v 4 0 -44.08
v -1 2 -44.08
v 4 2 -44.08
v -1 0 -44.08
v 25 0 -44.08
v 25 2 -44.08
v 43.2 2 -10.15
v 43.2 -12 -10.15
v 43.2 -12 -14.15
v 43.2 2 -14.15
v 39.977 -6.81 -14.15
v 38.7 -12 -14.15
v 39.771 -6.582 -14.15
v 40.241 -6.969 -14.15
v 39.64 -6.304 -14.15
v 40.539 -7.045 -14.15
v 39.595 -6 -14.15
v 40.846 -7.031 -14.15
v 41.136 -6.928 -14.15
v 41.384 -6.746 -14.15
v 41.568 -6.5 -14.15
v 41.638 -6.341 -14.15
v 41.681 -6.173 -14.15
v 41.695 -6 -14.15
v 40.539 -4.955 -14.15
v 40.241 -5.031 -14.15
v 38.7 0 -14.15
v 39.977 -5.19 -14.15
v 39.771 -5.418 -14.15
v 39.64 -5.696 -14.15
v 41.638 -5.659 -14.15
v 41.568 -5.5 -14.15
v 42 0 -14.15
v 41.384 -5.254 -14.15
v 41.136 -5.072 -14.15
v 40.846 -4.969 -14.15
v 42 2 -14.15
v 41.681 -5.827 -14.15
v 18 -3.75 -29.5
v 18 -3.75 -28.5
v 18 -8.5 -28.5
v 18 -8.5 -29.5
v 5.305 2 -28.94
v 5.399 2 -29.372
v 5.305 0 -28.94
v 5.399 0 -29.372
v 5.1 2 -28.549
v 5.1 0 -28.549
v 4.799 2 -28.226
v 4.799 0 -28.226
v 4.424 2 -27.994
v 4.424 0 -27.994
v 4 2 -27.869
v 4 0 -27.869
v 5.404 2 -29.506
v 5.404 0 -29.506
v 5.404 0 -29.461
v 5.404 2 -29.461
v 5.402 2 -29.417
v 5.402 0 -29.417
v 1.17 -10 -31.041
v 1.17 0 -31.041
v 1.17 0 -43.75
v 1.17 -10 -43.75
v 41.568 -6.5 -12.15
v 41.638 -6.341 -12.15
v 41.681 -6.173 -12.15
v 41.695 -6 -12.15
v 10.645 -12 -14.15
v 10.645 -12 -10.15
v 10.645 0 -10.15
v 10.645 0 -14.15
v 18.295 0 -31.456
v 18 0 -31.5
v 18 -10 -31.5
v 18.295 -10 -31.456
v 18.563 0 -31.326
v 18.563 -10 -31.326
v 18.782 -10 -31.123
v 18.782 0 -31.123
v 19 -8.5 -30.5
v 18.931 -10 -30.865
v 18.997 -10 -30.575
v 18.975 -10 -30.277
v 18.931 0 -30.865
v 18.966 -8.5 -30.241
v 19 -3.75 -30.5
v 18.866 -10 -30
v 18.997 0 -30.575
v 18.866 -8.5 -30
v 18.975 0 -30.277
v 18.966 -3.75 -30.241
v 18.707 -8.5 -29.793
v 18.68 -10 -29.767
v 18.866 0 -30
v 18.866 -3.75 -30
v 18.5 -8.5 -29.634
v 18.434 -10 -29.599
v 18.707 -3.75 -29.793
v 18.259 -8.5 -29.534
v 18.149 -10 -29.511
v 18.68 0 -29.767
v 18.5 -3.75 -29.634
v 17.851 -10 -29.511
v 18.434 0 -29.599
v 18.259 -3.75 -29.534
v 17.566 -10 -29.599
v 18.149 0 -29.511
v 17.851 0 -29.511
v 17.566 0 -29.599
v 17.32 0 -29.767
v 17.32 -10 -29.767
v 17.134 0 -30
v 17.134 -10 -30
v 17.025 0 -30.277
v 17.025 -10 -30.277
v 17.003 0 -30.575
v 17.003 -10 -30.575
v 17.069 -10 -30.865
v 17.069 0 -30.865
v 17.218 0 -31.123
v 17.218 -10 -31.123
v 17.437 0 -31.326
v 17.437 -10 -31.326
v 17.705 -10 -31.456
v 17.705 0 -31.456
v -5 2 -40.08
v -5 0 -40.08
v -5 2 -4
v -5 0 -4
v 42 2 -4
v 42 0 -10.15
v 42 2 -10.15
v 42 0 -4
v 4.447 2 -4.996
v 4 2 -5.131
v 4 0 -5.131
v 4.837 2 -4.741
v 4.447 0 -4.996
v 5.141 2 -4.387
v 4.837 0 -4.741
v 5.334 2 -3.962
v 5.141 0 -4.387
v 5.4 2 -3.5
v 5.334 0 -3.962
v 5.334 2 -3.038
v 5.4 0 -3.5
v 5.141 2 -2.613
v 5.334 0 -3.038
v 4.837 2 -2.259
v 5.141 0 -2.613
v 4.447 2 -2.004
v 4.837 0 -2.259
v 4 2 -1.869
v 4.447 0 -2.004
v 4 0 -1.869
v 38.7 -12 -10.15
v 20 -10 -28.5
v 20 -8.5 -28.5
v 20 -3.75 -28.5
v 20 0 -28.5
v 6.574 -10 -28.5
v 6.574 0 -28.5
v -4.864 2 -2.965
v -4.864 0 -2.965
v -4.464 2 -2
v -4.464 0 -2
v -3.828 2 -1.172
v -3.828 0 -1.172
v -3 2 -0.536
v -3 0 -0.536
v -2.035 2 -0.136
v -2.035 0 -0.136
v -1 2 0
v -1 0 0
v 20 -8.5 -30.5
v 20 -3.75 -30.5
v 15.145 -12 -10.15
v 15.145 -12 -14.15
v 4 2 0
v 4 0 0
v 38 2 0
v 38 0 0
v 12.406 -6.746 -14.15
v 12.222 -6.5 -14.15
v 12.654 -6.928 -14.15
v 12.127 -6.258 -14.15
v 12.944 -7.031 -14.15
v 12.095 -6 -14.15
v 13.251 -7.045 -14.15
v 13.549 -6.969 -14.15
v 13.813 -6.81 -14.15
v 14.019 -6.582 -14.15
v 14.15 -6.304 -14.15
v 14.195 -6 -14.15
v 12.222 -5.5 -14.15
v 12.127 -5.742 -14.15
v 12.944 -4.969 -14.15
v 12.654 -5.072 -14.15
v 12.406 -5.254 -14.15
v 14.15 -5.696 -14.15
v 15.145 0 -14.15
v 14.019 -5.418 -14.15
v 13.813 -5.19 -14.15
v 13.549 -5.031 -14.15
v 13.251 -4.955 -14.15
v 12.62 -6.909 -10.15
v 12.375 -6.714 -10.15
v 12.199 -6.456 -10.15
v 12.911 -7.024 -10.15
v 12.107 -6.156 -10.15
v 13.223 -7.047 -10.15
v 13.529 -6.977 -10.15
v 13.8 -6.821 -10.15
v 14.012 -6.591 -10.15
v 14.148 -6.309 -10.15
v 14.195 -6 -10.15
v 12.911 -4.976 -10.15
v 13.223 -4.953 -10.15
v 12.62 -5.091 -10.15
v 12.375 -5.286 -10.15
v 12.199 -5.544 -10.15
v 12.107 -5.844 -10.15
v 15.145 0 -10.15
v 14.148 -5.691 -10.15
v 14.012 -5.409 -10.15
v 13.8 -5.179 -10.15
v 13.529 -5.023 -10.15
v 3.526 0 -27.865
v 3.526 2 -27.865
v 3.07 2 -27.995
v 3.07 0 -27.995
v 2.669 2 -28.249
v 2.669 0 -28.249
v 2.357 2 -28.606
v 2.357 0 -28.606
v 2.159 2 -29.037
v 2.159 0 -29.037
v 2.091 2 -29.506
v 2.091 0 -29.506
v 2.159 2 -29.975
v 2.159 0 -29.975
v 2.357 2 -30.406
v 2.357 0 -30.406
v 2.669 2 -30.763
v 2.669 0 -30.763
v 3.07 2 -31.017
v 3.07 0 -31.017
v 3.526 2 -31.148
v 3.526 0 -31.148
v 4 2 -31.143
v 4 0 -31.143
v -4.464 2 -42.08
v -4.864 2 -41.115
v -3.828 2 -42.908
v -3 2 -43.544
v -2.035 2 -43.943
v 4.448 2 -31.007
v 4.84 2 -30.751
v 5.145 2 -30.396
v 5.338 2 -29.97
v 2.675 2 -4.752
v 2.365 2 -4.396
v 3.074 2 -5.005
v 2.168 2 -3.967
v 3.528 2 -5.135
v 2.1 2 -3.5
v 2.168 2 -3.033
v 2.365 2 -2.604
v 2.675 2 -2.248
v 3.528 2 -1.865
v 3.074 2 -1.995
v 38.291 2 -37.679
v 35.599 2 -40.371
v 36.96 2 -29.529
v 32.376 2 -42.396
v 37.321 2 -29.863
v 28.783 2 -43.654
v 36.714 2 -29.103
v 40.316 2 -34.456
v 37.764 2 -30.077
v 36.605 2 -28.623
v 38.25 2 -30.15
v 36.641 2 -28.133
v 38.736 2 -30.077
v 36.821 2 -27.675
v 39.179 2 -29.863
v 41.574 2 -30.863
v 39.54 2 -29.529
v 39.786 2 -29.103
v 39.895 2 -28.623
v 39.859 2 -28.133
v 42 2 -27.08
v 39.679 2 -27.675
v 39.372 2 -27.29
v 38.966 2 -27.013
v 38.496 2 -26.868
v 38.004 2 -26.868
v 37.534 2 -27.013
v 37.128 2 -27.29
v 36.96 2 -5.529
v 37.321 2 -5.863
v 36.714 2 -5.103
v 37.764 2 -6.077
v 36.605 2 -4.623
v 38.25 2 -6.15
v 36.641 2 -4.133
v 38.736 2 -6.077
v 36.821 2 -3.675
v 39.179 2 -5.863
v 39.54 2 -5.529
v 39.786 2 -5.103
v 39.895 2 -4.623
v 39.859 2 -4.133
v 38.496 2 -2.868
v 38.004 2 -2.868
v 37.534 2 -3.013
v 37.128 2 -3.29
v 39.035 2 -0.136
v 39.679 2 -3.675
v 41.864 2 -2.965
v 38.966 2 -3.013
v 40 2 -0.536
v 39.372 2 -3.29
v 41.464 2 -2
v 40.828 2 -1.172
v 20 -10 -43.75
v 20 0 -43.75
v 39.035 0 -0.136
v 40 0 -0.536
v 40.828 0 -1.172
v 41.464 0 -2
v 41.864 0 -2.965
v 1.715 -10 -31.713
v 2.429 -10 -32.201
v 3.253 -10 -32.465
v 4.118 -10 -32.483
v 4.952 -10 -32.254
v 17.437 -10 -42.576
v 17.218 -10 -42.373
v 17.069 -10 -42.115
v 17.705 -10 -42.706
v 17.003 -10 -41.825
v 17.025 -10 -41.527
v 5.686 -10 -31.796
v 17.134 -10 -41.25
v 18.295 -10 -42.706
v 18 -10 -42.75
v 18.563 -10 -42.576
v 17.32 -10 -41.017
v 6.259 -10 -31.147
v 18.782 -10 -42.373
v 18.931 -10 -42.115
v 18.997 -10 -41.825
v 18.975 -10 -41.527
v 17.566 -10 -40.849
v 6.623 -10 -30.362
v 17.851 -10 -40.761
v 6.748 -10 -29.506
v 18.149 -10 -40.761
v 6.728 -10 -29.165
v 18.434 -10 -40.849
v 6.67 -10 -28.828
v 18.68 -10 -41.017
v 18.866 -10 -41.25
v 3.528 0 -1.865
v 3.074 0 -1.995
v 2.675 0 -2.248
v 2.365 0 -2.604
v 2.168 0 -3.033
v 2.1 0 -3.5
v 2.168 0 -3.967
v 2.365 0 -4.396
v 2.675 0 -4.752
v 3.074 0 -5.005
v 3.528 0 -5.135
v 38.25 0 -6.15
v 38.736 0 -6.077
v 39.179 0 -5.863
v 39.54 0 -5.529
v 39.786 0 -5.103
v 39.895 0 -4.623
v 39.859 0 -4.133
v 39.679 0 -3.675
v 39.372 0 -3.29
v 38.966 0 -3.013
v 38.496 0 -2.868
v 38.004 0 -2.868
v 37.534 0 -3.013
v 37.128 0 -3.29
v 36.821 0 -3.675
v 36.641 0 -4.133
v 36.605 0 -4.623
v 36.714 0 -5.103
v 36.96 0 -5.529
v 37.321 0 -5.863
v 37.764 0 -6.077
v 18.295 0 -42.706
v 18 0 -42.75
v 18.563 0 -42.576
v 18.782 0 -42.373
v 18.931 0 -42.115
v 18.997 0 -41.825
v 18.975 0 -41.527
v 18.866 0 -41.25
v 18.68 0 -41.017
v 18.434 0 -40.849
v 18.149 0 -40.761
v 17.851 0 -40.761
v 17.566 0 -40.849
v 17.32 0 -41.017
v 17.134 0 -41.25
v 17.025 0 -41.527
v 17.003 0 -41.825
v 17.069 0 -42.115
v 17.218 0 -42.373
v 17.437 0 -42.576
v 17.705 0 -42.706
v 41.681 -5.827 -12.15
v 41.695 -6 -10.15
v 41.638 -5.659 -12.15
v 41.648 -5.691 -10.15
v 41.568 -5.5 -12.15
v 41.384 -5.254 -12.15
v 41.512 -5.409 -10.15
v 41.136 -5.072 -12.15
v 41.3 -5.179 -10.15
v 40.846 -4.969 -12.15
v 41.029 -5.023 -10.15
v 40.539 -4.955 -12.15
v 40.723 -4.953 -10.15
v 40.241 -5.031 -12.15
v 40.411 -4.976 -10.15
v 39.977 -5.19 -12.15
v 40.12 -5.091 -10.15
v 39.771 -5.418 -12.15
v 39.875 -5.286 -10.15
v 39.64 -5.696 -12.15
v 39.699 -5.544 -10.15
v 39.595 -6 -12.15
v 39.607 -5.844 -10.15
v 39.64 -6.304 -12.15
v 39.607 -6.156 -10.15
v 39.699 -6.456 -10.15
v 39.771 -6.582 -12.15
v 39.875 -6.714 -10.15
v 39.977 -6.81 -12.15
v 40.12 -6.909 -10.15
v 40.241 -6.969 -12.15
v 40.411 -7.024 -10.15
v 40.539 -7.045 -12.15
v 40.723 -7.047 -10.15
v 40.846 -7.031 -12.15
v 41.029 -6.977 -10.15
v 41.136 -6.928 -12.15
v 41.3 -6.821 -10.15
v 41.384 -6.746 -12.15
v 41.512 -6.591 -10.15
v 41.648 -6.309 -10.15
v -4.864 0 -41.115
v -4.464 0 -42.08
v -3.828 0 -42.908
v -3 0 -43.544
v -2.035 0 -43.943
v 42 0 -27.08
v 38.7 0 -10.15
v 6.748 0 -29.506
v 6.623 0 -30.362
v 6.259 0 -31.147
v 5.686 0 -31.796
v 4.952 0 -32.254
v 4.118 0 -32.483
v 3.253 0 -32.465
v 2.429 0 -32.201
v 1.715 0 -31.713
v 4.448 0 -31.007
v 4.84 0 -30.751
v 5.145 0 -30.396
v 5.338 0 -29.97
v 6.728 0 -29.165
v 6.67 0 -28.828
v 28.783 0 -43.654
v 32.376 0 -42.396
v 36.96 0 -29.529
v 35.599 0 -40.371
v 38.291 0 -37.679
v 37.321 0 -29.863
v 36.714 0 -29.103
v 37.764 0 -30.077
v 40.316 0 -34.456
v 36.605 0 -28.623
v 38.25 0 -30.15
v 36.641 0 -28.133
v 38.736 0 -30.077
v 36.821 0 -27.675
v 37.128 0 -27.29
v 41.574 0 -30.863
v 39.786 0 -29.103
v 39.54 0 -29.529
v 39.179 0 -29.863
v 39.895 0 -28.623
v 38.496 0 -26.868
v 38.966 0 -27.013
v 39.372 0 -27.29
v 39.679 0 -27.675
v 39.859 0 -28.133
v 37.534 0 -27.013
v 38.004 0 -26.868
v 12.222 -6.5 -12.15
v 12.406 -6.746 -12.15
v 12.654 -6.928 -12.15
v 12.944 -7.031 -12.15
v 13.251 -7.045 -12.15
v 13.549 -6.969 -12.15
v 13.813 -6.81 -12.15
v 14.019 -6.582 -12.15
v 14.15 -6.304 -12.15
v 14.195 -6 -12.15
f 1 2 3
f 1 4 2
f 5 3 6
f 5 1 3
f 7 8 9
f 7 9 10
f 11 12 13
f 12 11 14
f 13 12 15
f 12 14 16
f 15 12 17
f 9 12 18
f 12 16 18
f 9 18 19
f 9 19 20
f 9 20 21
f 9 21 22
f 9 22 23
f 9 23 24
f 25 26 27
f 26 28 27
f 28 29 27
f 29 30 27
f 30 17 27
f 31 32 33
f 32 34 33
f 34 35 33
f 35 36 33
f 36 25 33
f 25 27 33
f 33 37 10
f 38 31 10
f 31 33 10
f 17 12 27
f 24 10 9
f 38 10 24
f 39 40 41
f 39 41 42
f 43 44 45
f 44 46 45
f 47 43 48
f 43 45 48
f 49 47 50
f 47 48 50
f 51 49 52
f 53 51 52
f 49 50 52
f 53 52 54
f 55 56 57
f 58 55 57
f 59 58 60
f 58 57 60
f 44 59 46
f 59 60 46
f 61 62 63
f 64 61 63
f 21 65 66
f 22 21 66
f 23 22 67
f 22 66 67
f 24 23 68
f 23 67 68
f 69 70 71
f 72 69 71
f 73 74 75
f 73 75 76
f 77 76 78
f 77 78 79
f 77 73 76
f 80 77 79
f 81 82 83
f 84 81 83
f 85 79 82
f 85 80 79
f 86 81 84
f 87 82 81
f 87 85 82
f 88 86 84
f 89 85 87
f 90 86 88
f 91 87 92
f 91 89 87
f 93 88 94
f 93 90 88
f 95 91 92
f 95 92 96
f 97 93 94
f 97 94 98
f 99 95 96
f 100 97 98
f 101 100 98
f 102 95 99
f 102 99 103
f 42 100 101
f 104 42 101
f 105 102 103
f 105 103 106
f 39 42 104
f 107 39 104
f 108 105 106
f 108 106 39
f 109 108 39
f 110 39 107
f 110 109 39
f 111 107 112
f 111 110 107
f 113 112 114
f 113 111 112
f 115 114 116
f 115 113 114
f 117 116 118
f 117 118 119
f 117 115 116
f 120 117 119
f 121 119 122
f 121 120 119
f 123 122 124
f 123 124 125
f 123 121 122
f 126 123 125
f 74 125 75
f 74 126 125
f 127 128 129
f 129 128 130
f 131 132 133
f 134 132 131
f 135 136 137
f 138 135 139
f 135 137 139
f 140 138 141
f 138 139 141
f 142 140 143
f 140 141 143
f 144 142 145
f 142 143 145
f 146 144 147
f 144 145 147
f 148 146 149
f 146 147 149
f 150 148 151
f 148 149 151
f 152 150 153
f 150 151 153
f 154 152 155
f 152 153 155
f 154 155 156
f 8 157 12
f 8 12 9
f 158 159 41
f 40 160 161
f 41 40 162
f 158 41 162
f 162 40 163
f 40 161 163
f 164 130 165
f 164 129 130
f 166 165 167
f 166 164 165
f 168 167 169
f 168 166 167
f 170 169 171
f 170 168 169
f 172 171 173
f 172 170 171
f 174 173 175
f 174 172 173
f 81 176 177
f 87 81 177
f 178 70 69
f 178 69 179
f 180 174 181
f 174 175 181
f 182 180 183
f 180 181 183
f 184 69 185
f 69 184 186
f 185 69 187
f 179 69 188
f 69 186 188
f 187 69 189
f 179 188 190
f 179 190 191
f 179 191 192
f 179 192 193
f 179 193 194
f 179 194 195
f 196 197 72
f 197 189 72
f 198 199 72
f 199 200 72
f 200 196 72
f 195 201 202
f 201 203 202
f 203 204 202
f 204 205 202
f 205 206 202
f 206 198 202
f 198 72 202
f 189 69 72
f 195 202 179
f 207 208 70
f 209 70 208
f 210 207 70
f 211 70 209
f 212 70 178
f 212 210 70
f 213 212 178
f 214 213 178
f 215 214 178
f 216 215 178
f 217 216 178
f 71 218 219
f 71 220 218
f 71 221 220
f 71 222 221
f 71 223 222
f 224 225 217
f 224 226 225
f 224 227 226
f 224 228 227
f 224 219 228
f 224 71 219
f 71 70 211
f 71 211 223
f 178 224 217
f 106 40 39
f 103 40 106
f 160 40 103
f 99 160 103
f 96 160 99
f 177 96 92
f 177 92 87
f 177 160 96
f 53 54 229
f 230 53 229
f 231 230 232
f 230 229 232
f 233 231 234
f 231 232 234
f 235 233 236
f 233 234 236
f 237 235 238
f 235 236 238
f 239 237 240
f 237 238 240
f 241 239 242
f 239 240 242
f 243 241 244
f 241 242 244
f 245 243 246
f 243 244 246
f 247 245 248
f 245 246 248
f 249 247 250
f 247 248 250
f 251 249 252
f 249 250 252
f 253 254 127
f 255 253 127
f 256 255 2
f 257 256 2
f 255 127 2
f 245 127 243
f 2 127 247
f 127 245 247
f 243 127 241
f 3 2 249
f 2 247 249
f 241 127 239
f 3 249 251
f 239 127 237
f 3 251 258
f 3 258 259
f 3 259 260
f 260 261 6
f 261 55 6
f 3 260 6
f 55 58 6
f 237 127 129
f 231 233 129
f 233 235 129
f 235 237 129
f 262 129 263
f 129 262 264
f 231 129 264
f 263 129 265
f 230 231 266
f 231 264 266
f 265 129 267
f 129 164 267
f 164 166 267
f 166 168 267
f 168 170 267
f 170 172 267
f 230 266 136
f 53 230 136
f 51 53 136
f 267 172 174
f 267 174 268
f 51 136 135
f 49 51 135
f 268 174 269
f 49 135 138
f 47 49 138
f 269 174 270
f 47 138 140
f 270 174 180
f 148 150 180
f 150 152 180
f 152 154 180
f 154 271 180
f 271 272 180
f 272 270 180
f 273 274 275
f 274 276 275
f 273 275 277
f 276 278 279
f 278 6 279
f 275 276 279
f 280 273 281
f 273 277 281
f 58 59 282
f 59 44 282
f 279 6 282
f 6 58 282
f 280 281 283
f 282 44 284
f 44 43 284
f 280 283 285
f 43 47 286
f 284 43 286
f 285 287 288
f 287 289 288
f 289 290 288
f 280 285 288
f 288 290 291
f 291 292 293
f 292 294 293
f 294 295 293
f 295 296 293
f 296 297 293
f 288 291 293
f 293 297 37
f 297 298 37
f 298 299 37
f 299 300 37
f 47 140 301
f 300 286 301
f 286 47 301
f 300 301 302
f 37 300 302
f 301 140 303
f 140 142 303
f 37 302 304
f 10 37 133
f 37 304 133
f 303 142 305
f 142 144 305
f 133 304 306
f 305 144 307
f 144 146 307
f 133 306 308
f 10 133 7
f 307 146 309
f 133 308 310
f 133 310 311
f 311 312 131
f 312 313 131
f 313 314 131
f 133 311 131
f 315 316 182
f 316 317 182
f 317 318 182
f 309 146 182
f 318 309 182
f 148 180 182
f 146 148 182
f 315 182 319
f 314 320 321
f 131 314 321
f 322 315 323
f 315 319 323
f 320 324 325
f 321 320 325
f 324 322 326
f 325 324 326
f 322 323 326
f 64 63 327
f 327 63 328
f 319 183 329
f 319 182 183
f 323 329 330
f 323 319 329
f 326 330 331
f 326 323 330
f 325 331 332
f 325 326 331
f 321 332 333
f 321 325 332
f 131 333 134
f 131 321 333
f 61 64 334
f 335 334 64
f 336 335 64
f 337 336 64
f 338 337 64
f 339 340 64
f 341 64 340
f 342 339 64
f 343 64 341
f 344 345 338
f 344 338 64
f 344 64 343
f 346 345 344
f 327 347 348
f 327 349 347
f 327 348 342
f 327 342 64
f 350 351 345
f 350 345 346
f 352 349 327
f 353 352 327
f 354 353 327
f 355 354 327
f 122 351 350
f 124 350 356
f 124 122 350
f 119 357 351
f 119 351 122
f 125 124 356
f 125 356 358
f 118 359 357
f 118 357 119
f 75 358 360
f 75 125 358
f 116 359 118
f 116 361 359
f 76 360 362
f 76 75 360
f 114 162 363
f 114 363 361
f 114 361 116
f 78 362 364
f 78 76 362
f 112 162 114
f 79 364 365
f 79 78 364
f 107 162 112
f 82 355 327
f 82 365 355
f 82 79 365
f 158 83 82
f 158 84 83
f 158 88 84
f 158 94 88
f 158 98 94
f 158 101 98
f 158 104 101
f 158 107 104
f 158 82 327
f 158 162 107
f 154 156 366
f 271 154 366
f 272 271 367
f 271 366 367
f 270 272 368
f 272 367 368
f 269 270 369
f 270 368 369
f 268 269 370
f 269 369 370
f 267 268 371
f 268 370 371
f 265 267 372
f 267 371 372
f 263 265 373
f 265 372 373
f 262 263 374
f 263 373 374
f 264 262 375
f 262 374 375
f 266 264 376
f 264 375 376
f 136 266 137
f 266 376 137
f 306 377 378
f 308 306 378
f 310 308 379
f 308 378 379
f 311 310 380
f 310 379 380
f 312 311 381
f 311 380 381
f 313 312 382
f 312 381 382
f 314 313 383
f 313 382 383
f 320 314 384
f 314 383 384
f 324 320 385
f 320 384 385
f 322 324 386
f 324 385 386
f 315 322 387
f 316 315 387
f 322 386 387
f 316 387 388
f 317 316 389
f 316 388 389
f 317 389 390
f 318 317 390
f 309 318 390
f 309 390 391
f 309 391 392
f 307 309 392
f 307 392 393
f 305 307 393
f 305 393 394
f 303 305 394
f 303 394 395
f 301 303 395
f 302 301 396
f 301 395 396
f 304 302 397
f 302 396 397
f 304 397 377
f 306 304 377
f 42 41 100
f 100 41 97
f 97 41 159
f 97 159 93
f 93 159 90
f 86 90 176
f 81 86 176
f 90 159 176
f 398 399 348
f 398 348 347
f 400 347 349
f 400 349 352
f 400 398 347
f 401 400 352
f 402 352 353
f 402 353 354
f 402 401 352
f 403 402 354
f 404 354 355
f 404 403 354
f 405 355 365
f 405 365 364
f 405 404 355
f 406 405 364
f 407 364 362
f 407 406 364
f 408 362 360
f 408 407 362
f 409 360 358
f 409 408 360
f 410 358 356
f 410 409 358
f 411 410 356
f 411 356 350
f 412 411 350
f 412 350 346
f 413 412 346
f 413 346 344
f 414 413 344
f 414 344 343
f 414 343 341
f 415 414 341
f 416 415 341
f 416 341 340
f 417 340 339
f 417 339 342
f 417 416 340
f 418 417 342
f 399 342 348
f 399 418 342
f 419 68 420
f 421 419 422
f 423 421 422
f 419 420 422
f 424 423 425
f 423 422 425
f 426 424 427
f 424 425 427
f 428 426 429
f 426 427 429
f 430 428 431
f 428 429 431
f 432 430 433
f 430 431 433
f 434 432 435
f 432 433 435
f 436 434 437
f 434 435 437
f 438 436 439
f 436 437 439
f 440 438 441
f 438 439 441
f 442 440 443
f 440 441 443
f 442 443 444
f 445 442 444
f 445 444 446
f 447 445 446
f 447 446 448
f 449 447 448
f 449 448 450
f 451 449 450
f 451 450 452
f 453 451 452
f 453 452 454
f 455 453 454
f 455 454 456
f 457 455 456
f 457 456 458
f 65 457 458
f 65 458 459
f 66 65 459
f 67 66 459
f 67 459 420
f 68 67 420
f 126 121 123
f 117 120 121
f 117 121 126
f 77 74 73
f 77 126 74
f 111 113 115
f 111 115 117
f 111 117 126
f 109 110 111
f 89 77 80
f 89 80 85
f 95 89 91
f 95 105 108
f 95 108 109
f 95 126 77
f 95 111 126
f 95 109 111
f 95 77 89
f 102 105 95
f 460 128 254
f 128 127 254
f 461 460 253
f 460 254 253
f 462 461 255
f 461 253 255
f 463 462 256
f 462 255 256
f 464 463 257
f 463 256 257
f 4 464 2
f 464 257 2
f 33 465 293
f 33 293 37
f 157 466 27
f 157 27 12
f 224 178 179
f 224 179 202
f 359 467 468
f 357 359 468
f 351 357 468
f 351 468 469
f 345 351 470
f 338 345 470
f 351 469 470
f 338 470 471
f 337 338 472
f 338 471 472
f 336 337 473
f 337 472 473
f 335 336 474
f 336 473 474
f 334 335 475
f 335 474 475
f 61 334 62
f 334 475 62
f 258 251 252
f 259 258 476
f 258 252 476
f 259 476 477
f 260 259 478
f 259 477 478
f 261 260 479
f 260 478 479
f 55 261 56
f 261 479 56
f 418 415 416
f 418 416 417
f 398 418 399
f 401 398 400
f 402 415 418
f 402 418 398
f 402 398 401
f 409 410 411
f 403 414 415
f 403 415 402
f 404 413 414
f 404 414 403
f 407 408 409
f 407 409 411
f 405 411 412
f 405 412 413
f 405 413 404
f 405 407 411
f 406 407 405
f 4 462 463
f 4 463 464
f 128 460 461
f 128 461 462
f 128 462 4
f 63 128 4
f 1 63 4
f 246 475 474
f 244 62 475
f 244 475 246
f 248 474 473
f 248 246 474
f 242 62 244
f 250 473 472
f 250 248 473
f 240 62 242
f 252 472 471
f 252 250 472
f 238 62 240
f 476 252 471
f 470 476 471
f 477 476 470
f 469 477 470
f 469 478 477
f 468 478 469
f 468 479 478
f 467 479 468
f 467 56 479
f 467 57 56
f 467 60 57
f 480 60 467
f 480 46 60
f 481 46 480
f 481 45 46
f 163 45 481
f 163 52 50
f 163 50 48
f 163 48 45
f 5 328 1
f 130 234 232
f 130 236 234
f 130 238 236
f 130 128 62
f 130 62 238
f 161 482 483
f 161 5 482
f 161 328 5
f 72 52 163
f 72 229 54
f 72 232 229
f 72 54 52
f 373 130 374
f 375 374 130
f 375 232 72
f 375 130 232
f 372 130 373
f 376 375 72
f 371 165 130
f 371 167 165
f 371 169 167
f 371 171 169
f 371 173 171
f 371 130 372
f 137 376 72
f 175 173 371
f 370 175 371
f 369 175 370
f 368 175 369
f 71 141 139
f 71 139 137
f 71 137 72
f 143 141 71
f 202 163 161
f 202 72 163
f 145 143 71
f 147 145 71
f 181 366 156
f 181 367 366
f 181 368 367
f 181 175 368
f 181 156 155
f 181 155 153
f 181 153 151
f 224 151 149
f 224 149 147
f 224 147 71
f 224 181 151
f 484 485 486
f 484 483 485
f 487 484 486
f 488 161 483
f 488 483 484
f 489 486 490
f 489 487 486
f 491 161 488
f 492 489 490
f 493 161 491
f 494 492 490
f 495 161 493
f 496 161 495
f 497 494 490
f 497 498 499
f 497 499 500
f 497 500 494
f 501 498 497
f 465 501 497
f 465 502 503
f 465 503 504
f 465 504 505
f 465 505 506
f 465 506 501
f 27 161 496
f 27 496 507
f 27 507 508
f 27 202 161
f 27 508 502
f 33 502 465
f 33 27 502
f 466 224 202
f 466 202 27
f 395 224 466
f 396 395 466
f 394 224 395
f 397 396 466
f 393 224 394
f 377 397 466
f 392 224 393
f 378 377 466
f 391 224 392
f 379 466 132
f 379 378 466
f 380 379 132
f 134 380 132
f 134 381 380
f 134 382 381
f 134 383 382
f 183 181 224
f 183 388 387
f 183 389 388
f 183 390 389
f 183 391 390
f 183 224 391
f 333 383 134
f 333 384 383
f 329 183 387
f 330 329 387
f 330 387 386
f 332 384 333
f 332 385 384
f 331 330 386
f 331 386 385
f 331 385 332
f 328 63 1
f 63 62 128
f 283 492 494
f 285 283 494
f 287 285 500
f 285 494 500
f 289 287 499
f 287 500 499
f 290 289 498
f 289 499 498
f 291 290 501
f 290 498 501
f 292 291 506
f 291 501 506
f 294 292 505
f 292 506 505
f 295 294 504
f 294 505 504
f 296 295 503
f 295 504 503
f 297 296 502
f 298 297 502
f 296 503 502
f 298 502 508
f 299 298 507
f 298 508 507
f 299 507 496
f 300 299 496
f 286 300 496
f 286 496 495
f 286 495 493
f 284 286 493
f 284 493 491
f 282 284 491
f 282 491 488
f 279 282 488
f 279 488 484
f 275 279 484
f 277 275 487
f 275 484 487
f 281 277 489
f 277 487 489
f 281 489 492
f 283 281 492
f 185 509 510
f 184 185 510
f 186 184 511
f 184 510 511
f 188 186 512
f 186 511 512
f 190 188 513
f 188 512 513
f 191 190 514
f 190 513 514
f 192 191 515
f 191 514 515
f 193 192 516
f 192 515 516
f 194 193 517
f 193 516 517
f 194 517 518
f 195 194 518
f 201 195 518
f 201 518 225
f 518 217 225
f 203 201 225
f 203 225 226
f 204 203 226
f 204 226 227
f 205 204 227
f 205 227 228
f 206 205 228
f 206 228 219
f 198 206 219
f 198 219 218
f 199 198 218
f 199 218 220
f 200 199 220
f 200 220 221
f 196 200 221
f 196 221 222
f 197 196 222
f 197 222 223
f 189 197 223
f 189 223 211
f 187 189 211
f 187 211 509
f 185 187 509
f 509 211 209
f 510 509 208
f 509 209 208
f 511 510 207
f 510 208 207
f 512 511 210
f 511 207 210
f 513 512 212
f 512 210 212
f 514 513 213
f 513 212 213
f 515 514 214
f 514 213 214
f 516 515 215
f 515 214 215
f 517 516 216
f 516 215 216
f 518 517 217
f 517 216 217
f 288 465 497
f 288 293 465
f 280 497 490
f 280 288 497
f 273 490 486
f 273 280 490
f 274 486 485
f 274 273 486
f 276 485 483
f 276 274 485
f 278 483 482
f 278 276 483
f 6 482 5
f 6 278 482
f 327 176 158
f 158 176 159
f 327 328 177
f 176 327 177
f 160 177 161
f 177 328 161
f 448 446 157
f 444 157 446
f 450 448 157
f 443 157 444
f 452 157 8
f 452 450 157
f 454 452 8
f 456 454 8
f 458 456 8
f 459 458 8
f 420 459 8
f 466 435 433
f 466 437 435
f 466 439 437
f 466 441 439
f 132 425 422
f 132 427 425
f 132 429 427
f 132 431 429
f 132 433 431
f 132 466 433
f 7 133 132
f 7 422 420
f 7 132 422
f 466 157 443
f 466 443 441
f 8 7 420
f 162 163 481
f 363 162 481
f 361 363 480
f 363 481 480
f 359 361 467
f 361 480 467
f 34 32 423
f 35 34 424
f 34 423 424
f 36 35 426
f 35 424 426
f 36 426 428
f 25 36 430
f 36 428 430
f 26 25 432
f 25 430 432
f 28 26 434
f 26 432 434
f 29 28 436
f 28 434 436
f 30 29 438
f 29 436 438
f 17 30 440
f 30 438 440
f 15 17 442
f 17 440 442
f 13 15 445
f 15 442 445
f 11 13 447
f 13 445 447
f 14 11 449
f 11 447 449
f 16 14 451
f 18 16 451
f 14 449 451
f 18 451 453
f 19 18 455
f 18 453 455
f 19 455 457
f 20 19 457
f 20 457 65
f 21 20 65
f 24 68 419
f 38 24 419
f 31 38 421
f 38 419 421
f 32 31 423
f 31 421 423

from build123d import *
from build123d.topology import SkipClean

# Parameters (mm, degrees)
SKETCH1_W           = 41.99999943
SKETCH1_H           = 32.99999982
BOSS_EXTRUDE1_DEPTH = 2
FILLET1_R           = 4
SKETCH3_R           = 1.65
CUT_EXTRUDE1_DEPTH  = 2
SKETCH5_W           = 41.99999943
SKETCH5_H           = 16
BOSS_EXTRUDE3_DEPTH = 2
SKETCH6_R           = 1.65
SKETCH6_R_2         = 1.656480043
CUT_EXTRUDE2_DEPTH  = 2
FILLET2_R           = 17
FILLET3_R           = 4
SKETCH7_W           = 9
SKETCH7_H           = 44.079753615
BOSS_EXTRUDE4_DEPTH = 2
CUT_EXTRUDE3_DEPTH  = 2
FILLET4_R           = 4
SKETCH9_R           = 1
BOSS_EXTRUDE5_DEPTH = 10
SKETCH10_W          = 1.2
SKETCH10_H          = 2
BOSS_EXTRUDE6_DEPTH = 2
SKETCH11_W          = 4.5
SKETCH11_H          = 2
BOSS_EXTRUDE7_DEPTH = 12
CUT_EXTRUDE4_DEPTH  = 10
SKETCH13_W          = 2
SKETCH13_H          = 4.75
CUT_EXTRUDE5_DEPTH  = 2
BOSS_EXTRUDE8_START = 2
SKETCH15_W          = 4.5
SKETCH15_H          = 12
SKETCH15_R          = 1.05
BOSS_EXTRUDE8_DEPTH = 2


with BuildPart() as part:
    # Sketch1 → Boss-Extrude1 (new body)
    with BuildSketch(Plane(origin=(0, 0, 0), x_dir=(1, 0, 0), z_dir=(0, 1, 0))):
        with Locations((20.999999715, 16.49999991)):
            Rectangle(SKETCH1_W, SKETCH1_H)
    extrude(amount=BOSS_EXTRUDE1_DEPTH)

    # Fillet1
    fillet1_edges = [part.edges().sort_by_distance(p)[0] for p in [
        (0, 1, -32.99999982),
        (41.99999943, 1, -32.99999982),
        (41.99999943, 1, 0),
        (0, 1, 0),
    ]]
    fillet(fillet1_edges, radius=FILLET1_R)

    # Sketch3 → Cut-Extrude1 (cut)
    with BuildSketch(Plane.XZ):
        with Locations(Location((3.75, -3.5, 0), (0, 0, 270))):
            Circle(SKETCH3_R)
        with Locations(Location((3.75, -29.499999821, 0), (0, 0, 270))):
            Circle(SKETCH3_R)
        with Locations(Location((38.249999434, -28.499999821, 0), (0, 0, 270))):
            Circle(SKETCH3_R)
        with Locations(Location((38.249999434, -4.5, 0), (0, 0, 270))):
            Circle(SKETCH3_R)
    extrude(amount=-CUT_EXTRUDE1_DEPTH, mode=Mode.SUBTRACT)

    # Sketch5 → Boss-Extrude3 (add)
    with BuildSketch(Plane.XZ):
        with Locations((20.999999715, -36.079753615)):
            Rectangle(SKETCH5_W, SKETCH5_H)
    extrude(amount=-BOSS_EXTRUDE3_DEPTH)

    # Sketch6 → Cut-Extrude2 (cut)
    with BuildSketch(Plane.XZ):
        with Locations(Location((38.249999434, -28.499999821, 0), (0, 0, 270))):
            Circle(SKETCH6_R)
        with Locations(Location((3.747696905, -29.506056777, 0), (0, 0, 270))):
            Circle(SKETCH6_R_2)
    extrude(amount=-CUT_EXTRUDE2_DEPTH, mode=Mode.SUBTRACT)

    # Fillet2
    fillet2_edges = [part.edges().sort_by_distance(p)[0] for p in [
        (41.99999943, 1, -44.079753615),
    ]]
    fillet(fillet2_edges, radius=FILLET2_R)

    # Fillet3
    fillet3_edges = [part.edges().sort_by_distance(p)[0] for p in [
        (0, 1, -44.079753615),
    ]]
    fillet(fillet3_edges, radius=FILLET3_R)

    # Sketch7 → Boss-Extrude4 (add)
    with BuildSketch(Plane.XZ):
        with Locations((-0.5, -22.039876808)):
            Rectangle(SKETCH7_W, SKETCH7_H)
    extrude(amount=-BOSS_EXTRUDE4_DEPTH)

    # Sketch8 → Cut-Extrude3 (cut)
    with SkipClean():  # the faces are left unmerged after this step: merging them gives an invalid solid
        with BuildSketch(Plane.XZ):
            with BuildLine():
                ThreePointArc((4, -5.130950643), (5.001998403, -4.574709263), (5.4, -3.5))
                ThreePointArc((5.4, -3.5), (5.001998403, -2.425290737), (4, -1.869049357))
                Line((4, -1.869049357), (4, -5.130950643))
            make_face()
            with BuildLine():
                Line((4, -5.130950643), (4, -1.869049357))
                ThreePointArc((4, -1.869049357), (2.1, -3.5), (4, -5.130950643))
            make_face()
            with BuildLine():
                ThreePointArc((4, -1.869049357), (5.4, -3.5), (4, -5.130950643))
                Line((4, -5.130950643), (4, -1.869049357))
            make_face()
            with BuildLine():
                ThreePointArc((4, -27.86890398), (5.404176948, -29.506056777), (4, -31.143209574))
                Line((4, -31.143209574), (4, -27.86890398))
            make_face()
            with BuildLine():
                ThreePointArc((5.404176948, -29.506056777), (5.402815419, -29.43890888), (5.398733067, -29.371871366))
                ThreePointArc((5.398733067, -29.371871366), (4.96029858, -28.377551876), (4, -27.86890398))
                Line((4, -27.86890398), (4, -31.143209574))
                ThreePointArc((4, -31.143209574), (5.005047527, -30.584479489), (5.404176948, -29.506056777))
            make_face()
            with BuildLine():
                Line((4, -31.143209574), (4, -27.86890398))
                ThreePointArc((4, -27.86890398), (2.091216862, -29.506056777), (4, -31.143209574))
            make_face()
        extrude(amount=-CUT_EXTRUDE3_DEPTH, mode=Mode.SUBTRACT)

    # Fillet4
    fillet4_edges = [part.edges().sort_by_distance(p)[0] for p in [
        (-5, 1, -44.079753615),
        (-5, 1, 0),
    ]]
    fillet(fillet4_edges, radius=FILLET4_R)

    # Sketch9 → Boss-Extrude5 (add)
    with BuildSketch(Plane.XZ):
        with BuildLine():
            Line((19.99999943, -38.62499991), (19.99999943, -28.49999991))
            Line((19.99999943, -28.49999991), (6.573975303, -28.49999991))
            ThreePointArc((6.573975303, -28.49999991), (6.703947503, -28.995584051), (6.747696905, -29.506056777))
            ThreePointArc((6.747696905, -29.506056777), (4.543595006, -32.398555042), (1.16999943, -31.040812694))
            Line((1.16999943, -31.040812694), (1.16999943, -43.74999991))
            Line((1.16999943, -43.74999991), (19.99999943, -43.74999991))
            Line((19.99999943, -43.74999991), (19.99999943, -38.62499991))
        make_face()
        with Locations(Location((17.99999943, -41.74999991, 0), (0, 0, 270))):
            Circle(SKETCH9_R, mode=Mode.SUBTRACT)
        with Locations(Location((17.99999943, -30.49999991, 0), (0, 0, 270))):
            Circle(SKETCH9_R, mode=Mode.SUBTRACT)
    extrude(amount=BOSS_EXTRUDE5_DEPTH)

    # Sketch10 → Boss-Extrude6 (add)
    with BuildSketch(Plane(origin=(0, 2, 0), x_dir=(1, 0, 0), z_dir=(0, 1, 0))):
        with Locations((42.59999943, 13.15)):
            Rectangle(SKETCH10_W, SKETCH10_H)
    extrude(amount=-BOSS_EXTRUDE6_DEPTH)

    # Sketch11 → Boss-Extrude7 (add)
    with BuildSketch(Plane.XZ):
        with Locations((40.94999943, -13.15)):
            Rectangle(SKETCH11_W, SKETCH11_H)
        with Locations((12.894917885, -13.15)):
            Rectangle(SKETCH11_W, SKETCH11_H)
    extrude(amount=BOSS_EXTRUDE7_DEPTH)

    # Sketch12 → Cut-Extrude4 (cut)
    with BuildSketch(Plane.XY.offset(-12.15)):
        with BuildLine():
            ThreePointArc((41.694917885, -6), (41.66275253, -5.742099563), (41.568227151, -5.5))
            ThreePointArc((41.568227151, -5.5), (39.594917885, -6), (41.568227151, -6.5))
            ThreePointArc((41.568227151, -6.5), (41.66275253, -6.257900437), (41.694917885, -6))
        make_face()
        with BuildLine():
            ThreePointArc((12.221608619, -5.5), (12.094917885, -6), (12.221608619, -6.5))
            ThreePointArc((12.221608619, -6.5), (13.402818322, -7.017834645), (14.194917885, -6))
            ThreePointArc((14.194917885, -6), (13.402818322, -4.982165355), (12.221608619, -5.5))
        make_face()
    extrude(amount=-CUT_EXTRUDE4_DEPTH, mode=Mode.SUBTRACT)

    # Sketch13 → Cut-Extrude5 (cut)
    with BuildSketch(Plane(origin=(19.99999943, 0, 0), x_dir=(0, 0, -1), z_dir=(1, 0, 0))):
        with Locations((29.49999991, -6.125)):
            Rectangle(SKETCH13_W, SKETCH13_H)
    extrude(amount=-CUT_EXTRUDE5_DEPTH, mode=Mode.SUBTRACT)

    # Sketch15 → Boss-Extrude8 (add)
    # profile 1 of 2: a face of its own
    with BuildSketch(Plane.XY.offset(-12.15).offset(BOSS_EXTRUDE8_START)):
        with Locations((12.894917885, -6)):
            Rectangle(SKETCH15_W, SKETCH15_H)
        with Locations((13.144917885, -6)):
            Circle(SKETCH15_R, mode=Mode.SUBTRACT)
    # profile 2 of 2: a face of its own
    with BuildSketch(Plane.XY.offset(-12.15).offset(BOSS_EXTRUDE8_START)):
        Polygon((41.99999943, 2), (41.99999943, 0), (38.69999943, 0), (38.69999943, -12), (43.19999943, -12), (43.19999943, 2), align=None)
        with Locations((40.644917885, -6)):
            Circle(SKETCH15_R, mode=Mode.SUBTRACT)
    extrude(amount=-BOSS_EXTRUDE8_DEPTH)


solid = part.part
